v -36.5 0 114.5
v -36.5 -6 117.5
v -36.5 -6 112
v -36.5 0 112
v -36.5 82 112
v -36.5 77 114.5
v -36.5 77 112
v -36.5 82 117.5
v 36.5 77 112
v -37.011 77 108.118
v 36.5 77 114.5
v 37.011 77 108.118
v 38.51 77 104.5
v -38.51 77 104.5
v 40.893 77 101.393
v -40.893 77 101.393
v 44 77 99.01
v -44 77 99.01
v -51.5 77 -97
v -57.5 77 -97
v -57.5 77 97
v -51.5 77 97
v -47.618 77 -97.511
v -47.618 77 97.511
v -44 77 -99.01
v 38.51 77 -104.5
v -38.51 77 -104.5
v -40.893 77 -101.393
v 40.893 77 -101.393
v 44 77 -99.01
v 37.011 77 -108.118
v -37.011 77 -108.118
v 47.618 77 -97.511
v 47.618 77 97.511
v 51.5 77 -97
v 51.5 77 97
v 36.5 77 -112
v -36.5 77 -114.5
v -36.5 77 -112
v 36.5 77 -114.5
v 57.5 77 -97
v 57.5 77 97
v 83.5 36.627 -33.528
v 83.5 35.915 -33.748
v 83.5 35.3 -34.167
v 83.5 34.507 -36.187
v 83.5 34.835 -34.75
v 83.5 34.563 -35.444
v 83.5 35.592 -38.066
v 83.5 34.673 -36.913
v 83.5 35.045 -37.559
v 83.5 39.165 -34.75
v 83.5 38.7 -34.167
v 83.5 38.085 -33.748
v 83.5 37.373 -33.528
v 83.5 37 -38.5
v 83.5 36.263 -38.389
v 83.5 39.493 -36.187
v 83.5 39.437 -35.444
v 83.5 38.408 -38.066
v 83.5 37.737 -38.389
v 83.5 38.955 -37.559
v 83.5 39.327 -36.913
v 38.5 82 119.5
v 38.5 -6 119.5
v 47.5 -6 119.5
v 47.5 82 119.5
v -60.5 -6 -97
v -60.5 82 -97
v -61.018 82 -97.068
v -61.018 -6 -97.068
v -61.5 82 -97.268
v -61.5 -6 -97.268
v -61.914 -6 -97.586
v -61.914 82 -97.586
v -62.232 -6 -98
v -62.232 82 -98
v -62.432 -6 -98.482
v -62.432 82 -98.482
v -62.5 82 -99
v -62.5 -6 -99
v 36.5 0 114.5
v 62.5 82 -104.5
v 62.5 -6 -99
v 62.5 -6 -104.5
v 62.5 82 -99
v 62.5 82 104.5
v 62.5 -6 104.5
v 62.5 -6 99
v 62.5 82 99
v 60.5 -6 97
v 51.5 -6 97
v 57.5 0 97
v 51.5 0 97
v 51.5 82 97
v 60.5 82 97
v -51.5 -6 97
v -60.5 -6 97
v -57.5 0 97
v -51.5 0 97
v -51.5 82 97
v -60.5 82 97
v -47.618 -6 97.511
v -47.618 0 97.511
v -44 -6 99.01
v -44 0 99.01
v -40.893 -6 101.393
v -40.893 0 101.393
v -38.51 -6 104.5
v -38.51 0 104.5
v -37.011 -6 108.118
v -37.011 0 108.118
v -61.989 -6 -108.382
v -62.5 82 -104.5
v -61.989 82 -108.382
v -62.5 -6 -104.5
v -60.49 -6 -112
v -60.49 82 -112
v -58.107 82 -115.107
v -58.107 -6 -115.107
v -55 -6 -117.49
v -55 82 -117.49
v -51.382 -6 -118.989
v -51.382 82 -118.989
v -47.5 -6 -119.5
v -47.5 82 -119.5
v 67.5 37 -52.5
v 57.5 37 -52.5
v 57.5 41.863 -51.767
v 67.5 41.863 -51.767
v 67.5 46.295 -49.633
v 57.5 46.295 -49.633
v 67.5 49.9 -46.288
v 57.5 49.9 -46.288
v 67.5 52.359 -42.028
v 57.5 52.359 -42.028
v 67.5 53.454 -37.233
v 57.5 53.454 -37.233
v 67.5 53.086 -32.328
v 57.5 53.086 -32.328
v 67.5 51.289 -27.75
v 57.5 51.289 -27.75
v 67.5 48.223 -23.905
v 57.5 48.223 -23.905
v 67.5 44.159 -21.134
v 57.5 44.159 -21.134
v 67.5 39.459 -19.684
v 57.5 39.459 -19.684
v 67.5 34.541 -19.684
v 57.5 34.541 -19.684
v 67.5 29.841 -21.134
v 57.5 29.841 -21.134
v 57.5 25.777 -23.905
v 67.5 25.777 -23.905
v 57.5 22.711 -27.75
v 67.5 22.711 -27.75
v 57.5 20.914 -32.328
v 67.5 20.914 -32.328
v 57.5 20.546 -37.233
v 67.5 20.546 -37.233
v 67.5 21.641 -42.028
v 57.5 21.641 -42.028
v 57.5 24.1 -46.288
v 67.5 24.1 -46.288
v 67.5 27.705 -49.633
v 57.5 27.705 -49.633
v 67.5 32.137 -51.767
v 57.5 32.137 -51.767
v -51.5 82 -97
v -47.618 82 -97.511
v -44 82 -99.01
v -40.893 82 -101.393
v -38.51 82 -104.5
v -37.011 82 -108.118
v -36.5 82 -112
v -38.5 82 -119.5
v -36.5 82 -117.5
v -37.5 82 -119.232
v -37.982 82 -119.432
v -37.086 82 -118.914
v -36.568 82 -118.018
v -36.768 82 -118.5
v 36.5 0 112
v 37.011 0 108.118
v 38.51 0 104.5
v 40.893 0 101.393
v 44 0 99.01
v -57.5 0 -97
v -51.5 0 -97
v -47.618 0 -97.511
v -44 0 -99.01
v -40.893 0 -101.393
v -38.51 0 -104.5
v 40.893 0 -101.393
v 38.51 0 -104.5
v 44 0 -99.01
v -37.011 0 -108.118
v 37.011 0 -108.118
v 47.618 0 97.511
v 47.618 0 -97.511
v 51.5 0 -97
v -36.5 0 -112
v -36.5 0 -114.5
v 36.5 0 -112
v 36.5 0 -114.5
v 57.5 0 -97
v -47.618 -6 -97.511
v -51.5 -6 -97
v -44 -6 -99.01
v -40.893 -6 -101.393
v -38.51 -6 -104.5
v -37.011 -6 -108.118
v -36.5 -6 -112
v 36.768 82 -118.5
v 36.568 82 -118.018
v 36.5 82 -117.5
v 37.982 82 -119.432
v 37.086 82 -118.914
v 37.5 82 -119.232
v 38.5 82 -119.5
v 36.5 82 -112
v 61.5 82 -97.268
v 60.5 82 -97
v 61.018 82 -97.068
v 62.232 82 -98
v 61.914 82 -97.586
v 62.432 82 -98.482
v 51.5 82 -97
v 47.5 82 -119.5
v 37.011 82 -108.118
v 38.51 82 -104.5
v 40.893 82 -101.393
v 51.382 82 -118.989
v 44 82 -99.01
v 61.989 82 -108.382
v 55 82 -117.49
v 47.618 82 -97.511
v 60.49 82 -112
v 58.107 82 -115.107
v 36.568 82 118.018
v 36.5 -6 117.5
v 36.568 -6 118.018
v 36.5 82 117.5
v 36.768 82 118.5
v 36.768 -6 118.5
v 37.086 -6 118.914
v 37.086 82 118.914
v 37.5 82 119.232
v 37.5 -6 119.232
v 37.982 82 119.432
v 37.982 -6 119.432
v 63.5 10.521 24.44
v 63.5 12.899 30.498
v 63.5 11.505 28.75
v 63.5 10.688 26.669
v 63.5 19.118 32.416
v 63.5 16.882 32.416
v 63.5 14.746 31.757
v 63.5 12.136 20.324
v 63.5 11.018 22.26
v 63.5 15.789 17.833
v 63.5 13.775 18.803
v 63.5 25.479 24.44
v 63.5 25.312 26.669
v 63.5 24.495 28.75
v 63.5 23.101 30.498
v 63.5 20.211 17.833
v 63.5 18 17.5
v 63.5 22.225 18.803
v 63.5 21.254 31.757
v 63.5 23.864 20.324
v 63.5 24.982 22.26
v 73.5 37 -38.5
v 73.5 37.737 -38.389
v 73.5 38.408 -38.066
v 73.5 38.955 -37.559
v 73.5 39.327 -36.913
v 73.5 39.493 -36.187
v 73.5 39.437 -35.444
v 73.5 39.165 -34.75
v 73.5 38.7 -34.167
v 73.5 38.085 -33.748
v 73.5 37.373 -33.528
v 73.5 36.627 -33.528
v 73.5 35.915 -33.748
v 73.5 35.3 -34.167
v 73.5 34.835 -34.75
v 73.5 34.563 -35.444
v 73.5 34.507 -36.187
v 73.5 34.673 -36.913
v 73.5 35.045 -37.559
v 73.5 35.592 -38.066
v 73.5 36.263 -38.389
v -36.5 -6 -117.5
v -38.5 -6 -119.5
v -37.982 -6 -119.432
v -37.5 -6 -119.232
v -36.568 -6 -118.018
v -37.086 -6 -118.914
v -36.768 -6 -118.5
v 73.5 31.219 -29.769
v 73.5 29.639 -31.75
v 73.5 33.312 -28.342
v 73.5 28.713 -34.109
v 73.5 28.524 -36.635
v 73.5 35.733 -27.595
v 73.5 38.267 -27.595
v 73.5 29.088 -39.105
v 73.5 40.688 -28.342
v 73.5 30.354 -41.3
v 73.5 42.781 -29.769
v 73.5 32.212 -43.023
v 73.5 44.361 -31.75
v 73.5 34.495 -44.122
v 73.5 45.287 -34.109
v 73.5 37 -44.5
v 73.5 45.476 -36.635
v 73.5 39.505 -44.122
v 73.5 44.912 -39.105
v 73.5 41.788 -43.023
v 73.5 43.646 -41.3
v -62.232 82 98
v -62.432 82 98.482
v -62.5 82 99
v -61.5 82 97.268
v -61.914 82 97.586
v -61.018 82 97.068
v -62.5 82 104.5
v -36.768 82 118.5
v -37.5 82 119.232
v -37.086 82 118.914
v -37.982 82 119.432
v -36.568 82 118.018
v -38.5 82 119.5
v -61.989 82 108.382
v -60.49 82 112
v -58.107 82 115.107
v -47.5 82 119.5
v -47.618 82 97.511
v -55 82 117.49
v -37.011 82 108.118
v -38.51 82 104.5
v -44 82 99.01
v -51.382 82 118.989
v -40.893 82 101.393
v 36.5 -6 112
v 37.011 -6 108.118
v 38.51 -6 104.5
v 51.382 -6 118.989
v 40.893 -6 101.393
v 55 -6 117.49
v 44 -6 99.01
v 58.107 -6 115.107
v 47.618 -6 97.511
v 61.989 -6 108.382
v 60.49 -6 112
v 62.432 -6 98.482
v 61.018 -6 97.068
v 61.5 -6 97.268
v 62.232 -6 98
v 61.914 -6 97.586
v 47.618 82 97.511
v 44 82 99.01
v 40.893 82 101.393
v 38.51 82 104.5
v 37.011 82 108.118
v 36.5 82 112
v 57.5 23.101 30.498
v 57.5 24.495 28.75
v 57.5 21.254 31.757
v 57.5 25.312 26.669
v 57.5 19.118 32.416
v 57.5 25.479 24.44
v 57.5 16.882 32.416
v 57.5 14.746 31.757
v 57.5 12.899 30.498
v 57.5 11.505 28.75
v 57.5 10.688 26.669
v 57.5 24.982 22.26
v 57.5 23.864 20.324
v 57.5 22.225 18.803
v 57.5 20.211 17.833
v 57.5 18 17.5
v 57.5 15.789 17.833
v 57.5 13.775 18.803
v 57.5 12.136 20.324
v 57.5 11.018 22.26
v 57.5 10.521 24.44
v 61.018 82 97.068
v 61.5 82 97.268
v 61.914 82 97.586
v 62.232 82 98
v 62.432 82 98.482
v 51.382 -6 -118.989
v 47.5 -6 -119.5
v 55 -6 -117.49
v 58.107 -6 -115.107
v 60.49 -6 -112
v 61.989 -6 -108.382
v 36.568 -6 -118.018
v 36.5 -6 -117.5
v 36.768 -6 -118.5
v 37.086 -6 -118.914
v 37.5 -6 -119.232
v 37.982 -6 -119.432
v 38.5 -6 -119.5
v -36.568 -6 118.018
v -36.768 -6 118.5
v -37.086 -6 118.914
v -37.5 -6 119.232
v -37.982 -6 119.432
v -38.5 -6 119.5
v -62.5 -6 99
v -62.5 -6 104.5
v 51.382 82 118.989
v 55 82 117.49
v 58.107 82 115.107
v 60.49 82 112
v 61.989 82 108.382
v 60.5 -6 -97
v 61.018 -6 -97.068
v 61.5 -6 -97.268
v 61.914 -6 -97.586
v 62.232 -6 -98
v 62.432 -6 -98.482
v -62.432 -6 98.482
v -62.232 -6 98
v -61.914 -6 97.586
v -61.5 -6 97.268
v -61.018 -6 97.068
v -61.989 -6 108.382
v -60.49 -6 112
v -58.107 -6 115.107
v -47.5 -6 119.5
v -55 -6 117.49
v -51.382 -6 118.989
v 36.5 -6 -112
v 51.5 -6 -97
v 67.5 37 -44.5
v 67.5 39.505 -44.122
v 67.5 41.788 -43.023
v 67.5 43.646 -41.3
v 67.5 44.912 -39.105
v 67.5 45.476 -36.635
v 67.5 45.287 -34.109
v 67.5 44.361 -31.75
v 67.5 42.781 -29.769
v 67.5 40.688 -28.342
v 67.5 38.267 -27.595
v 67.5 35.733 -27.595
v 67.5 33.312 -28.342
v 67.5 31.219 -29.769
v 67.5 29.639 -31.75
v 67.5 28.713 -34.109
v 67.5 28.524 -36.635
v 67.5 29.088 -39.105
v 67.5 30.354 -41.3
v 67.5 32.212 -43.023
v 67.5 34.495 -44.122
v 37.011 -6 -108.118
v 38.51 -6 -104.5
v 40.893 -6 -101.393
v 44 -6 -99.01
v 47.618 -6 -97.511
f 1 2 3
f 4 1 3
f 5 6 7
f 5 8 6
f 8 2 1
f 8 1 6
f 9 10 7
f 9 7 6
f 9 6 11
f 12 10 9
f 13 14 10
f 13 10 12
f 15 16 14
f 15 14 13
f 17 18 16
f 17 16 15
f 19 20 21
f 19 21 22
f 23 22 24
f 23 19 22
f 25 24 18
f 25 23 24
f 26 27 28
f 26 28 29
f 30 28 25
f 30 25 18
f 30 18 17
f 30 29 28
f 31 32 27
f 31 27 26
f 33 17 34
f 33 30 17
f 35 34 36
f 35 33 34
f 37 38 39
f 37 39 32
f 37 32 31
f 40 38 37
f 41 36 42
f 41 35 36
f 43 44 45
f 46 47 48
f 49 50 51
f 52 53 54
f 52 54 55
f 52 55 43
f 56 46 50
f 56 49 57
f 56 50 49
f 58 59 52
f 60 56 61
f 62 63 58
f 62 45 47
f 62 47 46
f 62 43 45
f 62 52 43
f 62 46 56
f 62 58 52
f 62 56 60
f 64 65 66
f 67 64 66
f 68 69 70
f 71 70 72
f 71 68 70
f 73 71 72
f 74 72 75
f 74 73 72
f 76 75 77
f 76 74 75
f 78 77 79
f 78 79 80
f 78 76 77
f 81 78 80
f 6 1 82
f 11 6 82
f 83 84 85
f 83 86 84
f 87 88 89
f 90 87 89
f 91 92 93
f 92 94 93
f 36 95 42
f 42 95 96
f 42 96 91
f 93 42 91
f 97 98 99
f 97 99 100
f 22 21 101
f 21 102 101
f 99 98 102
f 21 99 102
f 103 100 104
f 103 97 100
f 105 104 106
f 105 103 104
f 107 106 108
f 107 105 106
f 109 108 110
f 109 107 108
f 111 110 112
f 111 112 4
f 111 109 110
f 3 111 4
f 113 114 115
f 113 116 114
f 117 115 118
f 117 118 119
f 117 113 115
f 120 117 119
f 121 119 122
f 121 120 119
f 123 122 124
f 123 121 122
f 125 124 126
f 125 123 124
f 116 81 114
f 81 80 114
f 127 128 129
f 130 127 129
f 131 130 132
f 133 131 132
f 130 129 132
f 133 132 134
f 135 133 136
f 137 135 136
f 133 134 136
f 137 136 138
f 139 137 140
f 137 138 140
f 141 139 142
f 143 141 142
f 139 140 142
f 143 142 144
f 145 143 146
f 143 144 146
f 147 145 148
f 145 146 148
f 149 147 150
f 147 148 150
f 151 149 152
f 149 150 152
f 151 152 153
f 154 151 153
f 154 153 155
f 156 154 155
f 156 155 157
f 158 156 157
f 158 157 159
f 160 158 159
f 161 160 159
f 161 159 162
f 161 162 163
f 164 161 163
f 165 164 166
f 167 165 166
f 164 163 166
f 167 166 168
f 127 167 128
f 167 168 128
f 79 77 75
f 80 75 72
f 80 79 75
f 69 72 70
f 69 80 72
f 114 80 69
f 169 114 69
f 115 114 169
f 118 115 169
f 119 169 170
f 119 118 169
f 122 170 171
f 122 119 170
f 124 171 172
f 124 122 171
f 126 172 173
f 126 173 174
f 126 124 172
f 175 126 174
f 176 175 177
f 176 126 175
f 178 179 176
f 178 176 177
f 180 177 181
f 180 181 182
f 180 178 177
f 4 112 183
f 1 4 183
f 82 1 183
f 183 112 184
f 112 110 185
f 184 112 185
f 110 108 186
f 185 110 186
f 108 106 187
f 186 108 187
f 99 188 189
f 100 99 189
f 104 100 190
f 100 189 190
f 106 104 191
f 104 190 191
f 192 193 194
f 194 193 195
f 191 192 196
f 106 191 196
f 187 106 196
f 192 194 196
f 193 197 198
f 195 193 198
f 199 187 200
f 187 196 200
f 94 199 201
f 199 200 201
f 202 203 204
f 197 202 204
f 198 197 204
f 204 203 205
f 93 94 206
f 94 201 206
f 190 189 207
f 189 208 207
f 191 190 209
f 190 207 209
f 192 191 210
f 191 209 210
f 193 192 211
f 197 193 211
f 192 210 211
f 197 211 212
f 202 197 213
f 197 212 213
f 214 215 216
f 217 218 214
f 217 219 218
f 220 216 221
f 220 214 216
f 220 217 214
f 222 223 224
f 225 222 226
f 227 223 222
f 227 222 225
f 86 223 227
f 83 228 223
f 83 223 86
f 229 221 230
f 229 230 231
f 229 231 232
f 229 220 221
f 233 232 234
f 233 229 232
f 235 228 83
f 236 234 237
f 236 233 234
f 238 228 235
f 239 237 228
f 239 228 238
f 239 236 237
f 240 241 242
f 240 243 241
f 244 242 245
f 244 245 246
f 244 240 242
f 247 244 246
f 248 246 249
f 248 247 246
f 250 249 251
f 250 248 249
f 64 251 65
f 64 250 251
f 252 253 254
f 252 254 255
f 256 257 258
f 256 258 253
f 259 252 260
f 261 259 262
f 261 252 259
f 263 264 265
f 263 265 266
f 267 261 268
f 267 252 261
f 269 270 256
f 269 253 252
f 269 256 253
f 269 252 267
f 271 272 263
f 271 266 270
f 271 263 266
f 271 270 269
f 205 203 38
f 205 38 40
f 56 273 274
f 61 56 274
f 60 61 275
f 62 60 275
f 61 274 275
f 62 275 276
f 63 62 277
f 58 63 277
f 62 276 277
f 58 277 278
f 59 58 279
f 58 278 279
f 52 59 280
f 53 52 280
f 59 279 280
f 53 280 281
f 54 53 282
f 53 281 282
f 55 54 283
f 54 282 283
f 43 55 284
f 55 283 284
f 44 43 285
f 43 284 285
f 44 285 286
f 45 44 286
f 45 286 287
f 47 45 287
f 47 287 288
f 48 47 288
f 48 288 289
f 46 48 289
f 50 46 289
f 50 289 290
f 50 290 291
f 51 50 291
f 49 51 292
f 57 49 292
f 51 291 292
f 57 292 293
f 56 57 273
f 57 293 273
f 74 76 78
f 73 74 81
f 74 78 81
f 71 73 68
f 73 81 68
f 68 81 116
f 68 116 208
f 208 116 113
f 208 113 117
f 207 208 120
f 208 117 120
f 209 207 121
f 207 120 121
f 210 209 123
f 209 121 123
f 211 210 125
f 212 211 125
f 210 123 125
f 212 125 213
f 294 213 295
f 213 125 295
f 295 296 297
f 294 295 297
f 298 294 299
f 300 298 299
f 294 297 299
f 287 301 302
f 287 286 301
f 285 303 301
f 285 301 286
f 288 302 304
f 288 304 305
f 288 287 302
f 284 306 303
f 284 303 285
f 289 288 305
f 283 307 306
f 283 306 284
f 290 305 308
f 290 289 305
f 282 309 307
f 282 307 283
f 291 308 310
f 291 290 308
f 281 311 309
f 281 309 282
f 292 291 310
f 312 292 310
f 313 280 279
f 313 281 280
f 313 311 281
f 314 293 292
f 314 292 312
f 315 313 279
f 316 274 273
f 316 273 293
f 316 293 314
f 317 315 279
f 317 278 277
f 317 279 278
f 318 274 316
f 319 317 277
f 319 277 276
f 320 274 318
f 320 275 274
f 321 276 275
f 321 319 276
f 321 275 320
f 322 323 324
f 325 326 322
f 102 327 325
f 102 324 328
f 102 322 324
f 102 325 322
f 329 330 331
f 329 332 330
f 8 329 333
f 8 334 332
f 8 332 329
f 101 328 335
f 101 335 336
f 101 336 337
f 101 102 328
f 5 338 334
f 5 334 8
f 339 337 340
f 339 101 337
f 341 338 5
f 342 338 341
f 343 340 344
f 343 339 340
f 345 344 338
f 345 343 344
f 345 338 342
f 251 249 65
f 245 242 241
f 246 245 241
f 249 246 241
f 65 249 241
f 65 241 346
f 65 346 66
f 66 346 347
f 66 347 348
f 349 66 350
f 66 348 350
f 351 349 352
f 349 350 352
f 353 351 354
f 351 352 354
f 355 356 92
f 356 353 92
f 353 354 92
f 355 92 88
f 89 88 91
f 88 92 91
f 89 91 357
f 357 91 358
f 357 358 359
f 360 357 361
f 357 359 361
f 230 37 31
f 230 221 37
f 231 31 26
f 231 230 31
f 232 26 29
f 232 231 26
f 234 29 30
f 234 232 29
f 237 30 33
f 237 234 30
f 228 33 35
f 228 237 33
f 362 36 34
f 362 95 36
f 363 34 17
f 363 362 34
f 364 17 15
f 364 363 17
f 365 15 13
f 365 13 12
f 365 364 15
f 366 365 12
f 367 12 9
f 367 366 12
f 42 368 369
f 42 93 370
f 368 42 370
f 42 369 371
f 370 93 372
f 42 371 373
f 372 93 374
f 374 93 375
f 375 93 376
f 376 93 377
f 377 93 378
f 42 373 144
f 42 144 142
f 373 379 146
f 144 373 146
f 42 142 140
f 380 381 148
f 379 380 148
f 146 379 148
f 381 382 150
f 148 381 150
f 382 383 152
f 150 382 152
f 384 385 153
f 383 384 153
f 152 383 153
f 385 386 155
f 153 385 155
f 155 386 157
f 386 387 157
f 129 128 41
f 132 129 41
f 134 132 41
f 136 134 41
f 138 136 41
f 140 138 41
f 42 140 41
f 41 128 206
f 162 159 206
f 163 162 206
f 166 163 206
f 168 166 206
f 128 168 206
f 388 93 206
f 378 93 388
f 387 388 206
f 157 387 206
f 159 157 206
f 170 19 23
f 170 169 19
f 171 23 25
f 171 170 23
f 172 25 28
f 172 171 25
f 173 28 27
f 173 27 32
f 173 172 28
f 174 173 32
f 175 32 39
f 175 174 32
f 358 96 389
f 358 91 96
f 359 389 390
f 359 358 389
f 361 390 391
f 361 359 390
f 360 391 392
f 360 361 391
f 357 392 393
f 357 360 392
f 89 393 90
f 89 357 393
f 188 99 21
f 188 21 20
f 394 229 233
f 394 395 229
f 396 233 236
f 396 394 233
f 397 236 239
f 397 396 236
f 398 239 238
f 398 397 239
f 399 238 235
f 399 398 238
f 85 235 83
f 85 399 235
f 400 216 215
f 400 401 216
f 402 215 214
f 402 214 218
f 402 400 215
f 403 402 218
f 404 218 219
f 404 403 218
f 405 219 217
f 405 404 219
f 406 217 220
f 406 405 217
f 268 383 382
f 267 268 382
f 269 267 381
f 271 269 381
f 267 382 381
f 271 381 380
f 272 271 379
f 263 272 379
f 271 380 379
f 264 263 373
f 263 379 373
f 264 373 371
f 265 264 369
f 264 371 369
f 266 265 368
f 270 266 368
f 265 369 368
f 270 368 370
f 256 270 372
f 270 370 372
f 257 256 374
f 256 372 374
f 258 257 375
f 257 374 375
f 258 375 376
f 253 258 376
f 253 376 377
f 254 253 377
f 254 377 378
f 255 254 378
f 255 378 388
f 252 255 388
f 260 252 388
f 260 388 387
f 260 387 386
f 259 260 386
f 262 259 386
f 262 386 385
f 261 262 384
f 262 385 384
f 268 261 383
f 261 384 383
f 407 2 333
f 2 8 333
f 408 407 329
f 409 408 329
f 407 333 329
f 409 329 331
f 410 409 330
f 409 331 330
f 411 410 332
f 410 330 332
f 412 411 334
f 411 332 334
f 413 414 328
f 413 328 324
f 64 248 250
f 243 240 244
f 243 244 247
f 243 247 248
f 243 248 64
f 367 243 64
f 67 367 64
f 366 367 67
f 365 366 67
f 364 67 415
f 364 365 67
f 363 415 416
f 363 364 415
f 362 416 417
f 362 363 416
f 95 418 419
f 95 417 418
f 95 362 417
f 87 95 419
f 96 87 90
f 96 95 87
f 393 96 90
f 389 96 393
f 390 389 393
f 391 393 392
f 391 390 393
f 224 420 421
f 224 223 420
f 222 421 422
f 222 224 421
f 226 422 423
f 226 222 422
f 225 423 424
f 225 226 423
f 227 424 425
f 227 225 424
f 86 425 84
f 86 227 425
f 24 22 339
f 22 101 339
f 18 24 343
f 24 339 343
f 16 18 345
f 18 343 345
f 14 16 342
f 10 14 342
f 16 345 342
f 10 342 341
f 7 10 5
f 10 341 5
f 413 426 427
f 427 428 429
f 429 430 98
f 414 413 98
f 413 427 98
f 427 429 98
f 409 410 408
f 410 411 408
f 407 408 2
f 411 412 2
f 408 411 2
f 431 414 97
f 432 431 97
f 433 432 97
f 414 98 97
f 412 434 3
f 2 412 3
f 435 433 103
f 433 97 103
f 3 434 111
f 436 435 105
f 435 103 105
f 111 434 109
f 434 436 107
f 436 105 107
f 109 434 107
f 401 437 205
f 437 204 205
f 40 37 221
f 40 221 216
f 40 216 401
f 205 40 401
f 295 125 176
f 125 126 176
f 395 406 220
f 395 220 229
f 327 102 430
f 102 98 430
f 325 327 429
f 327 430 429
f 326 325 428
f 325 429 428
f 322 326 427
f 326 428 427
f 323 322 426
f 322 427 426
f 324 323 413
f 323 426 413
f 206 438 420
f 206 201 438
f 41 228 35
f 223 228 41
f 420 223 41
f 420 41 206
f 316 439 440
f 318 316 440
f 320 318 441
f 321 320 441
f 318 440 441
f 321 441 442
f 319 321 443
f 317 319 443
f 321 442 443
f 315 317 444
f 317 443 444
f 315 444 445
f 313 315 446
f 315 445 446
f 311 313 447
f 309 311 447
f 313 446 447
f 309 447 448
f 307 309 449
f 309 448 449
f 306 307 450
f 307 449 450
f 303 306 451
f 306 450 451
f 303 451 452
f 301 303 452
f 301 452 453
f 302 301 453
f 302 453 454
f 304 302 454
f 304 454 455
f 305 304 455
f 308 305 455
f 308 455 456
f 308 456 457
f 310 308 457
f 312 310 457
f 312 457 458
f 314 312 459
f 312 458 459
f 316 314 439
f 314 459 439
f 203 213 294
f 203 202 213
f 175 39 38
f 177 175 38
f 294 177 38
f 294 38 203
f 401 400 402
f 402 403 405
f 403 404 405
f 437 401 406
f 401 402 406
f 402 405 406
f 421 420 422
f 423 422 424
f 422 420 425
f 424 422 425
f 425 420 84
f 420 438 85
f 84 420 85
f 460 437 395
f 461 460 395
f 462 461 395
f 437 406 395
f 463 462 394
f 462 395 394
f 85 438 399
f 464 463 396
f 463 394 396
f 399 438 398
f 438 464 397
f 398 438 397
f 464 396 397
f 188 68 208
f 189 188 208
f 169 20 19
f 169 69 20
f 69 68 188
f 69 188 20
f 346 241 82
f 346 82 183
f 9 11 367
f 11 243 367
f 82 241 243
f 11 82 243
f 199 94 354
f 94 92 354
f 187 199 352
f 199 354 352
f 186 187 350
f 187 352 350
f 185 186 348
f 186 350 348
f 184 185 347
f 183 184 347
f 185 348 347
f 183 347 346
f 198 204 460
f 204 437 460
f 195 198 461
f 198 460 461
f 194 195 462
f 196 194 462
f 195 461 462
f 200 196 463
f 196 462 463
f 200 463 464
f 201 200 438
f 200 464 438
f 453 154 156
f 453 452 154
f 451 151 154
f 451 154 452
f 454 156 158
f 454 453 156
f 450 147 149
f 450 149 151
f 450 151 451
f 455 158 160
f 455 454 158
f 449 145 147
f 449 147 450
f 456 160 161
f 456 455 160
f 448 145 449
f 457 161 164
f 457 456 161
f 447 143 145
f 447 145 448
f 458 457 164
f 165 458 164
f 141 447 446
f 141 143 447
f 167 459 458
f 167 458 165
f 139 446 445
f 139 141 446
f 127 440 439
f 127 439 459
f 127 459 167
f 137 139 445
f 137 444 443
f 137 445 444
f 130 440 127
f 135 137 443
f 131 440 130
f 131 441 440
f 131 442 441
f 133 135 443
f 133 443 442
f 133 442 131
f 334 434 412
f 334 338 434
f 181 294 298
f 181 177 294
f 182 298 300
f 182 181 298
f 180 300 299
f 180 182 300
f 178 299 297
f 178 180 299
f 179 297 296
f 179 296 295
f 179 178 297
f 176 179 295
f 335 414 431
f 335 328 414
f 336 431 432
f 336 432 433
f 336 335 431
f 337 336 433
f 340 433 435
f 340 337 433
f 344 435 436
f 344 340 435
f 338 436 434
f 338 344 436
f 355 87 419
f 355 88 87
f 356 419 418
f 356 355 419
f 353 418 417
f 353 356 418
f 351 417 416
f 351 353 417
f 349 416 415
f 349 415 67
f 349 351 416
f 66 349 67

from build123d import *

# Parameters (mm, degrees)
SKETCH1_W                = 115
SKETCH1_H                = 229
BOSS_EXTRUDE1_DEPTH      = 77
BOSS_EXTRUDE3_DEPTH      = 5
BOSS_EXTRUDE3_DEPTH_BACK = 83
SKETCH12_W               = 26
SKETCH12_H               = 22.5
FILLET2_R                = 15
FILLET3_R                = 15
FILLET4_R                = 2
SKETCH13_R               = 7.5
BOSS_EXTRUDE4_DEPTH      = 6
SKETCH13_6_R             = 16.5
BOSS_EXTRUDE5_DEPTH      = 10
SKETCH14_R               = 8.5
BOSS_EXTRUDE6_DEPTH      = 6
SKETCH15_R               = 2.5
BOSS_EXTRUDE7_DEPTH      = 10


with BuildPart() as part:
    # Sketch1 → Boss-Extrude1 (new body)
    with BuildSketch(Plane(origin=(0, 0, 0), x_dir=(1, 0, 0), z_dir=(0, 1, 0))):
        Rectangle(SKETCH1_W, SKETCH1_H)
    extrude(amount=BOSS_EXTRUDE1_DEPTH)

    # Sketch12 → Boss-Extrude3 (add, two sides: drawn at the far end of the back side and taken through both)
    with BuildSketch(Plane(origin=(0, 77, 0), x_dir=(1, 0, 0), z_dir=(0, 1, 0)).offset(-BOSS_EXTRUDE3_DEPTH_BACK)):
        with Locations((-49.5, -108.25)):
            Rectangle(SKETCH12_W, SKETCH12_H)
        with Locations((49.5, -108.25)):
            Rectangle(SKETCH12_W, SKETCH12_H)
        with Locations((49.5, 108.25)):
            Rectangle(SKETCH12_W, SKETCH12_H)
        with Locations((-49.5, 108.25)):
            Rectangle(SKETCH12_W, SKETCH12_H)
    extrude(amount=BOSS_EXTRUDE3_DEPTH + BOSS_EXTRUDE3_DEPTH_BACK)

    # Fillet2
    fillet2_edges = [part.edges().sort_by_distance(p)[0] for p in [
        (-62.5, 38, -119.5),
        (62.5, 38, -119.5),
        (-62.5, 38, 119.5),
        (62.5, 38, 119.5),
    ]]
    fillet(fillet2_edges, radius=FILLET2_R)

    # Fillet3
    fillet3_edges = [part.edges().sort_by_distance(p)[0] for p in [
        (-36.5, -3, -97),
        (36.5, -3, -97),
        (-36.5, -3, 97),
        (36.5, -3, 97),
        (36.5, 79.5, 97),
        (-36.5, 79.5, 97),
        (36.5, 79.5, -97),
        (-36.5, 79.5, -97),
    ]]
    fillet(fillet3_edges, radius=FILLET3_R)

    # Fillet4
    fillet4_edges = [part.edges().sort_by_distance(p)[0] for p in [
        (-62.5, 38, -97),
        (-36.5, 38, -119.5),
        (36.5, 38, -119.5),
        (62.5, 38, -97),
        (62.5, 38, 97),
        (36.5, 38, 119.5),
        (-36.5, 38, 119.5),
        (-62.5, 38, 97),
    ]]
    fillet(fillet4_edges, radius=FILLET4_R)

    # Sketch13 → Boss-Extrude4 (add)
    with BuildSketch(Plane(origin=(57.5, 0, 0), x_dir=(0, 0, -1), z_dir=(1, 0, 0))):
        with Locations((-25, 18)):
            Circle(SKETCH13_R)
    extrude(amount=BOSS_EXTRUDE4_DEPTH)

    # Sketch13<6> → Boss-Extrude5 (add)
    with BuildSketch(Plane(origin=(57.5, 0, 0), x_dir=(0, 0, -1), z_dir=(1, 0, 0))):
        with Locations((36, 37)):
            Circle(SKETCH13_6_R)
    extrude(amount=BOSS_EXTRUDE5_DEPTH)

    # Sketch14 → Boss-Extrude6 (add)
    with BuildSketch(Plane(origin=(67.5, 0, 0), x_dir=(0, 0, -1), z_dir=(1, 0, 0))):
        with Locations((36, 37)):
            Circle(SKETCH14_R)
    extrude(amount=BOSS_EXTRUDE6_DEPTH)

    # Sketch15 → Boss-Extrude7 (add)
    with BuildSketch(Plane(origin=(73.5, 0, 0), x_dir=(0, 0, -1), z_dir=(1, 0, 0))):
        with Locations((36, 37)):
            Circle(SKETCH15_R)
    extrude(amount=BOSS_EXTRUDE7_DEPTH)


solid = part.part
